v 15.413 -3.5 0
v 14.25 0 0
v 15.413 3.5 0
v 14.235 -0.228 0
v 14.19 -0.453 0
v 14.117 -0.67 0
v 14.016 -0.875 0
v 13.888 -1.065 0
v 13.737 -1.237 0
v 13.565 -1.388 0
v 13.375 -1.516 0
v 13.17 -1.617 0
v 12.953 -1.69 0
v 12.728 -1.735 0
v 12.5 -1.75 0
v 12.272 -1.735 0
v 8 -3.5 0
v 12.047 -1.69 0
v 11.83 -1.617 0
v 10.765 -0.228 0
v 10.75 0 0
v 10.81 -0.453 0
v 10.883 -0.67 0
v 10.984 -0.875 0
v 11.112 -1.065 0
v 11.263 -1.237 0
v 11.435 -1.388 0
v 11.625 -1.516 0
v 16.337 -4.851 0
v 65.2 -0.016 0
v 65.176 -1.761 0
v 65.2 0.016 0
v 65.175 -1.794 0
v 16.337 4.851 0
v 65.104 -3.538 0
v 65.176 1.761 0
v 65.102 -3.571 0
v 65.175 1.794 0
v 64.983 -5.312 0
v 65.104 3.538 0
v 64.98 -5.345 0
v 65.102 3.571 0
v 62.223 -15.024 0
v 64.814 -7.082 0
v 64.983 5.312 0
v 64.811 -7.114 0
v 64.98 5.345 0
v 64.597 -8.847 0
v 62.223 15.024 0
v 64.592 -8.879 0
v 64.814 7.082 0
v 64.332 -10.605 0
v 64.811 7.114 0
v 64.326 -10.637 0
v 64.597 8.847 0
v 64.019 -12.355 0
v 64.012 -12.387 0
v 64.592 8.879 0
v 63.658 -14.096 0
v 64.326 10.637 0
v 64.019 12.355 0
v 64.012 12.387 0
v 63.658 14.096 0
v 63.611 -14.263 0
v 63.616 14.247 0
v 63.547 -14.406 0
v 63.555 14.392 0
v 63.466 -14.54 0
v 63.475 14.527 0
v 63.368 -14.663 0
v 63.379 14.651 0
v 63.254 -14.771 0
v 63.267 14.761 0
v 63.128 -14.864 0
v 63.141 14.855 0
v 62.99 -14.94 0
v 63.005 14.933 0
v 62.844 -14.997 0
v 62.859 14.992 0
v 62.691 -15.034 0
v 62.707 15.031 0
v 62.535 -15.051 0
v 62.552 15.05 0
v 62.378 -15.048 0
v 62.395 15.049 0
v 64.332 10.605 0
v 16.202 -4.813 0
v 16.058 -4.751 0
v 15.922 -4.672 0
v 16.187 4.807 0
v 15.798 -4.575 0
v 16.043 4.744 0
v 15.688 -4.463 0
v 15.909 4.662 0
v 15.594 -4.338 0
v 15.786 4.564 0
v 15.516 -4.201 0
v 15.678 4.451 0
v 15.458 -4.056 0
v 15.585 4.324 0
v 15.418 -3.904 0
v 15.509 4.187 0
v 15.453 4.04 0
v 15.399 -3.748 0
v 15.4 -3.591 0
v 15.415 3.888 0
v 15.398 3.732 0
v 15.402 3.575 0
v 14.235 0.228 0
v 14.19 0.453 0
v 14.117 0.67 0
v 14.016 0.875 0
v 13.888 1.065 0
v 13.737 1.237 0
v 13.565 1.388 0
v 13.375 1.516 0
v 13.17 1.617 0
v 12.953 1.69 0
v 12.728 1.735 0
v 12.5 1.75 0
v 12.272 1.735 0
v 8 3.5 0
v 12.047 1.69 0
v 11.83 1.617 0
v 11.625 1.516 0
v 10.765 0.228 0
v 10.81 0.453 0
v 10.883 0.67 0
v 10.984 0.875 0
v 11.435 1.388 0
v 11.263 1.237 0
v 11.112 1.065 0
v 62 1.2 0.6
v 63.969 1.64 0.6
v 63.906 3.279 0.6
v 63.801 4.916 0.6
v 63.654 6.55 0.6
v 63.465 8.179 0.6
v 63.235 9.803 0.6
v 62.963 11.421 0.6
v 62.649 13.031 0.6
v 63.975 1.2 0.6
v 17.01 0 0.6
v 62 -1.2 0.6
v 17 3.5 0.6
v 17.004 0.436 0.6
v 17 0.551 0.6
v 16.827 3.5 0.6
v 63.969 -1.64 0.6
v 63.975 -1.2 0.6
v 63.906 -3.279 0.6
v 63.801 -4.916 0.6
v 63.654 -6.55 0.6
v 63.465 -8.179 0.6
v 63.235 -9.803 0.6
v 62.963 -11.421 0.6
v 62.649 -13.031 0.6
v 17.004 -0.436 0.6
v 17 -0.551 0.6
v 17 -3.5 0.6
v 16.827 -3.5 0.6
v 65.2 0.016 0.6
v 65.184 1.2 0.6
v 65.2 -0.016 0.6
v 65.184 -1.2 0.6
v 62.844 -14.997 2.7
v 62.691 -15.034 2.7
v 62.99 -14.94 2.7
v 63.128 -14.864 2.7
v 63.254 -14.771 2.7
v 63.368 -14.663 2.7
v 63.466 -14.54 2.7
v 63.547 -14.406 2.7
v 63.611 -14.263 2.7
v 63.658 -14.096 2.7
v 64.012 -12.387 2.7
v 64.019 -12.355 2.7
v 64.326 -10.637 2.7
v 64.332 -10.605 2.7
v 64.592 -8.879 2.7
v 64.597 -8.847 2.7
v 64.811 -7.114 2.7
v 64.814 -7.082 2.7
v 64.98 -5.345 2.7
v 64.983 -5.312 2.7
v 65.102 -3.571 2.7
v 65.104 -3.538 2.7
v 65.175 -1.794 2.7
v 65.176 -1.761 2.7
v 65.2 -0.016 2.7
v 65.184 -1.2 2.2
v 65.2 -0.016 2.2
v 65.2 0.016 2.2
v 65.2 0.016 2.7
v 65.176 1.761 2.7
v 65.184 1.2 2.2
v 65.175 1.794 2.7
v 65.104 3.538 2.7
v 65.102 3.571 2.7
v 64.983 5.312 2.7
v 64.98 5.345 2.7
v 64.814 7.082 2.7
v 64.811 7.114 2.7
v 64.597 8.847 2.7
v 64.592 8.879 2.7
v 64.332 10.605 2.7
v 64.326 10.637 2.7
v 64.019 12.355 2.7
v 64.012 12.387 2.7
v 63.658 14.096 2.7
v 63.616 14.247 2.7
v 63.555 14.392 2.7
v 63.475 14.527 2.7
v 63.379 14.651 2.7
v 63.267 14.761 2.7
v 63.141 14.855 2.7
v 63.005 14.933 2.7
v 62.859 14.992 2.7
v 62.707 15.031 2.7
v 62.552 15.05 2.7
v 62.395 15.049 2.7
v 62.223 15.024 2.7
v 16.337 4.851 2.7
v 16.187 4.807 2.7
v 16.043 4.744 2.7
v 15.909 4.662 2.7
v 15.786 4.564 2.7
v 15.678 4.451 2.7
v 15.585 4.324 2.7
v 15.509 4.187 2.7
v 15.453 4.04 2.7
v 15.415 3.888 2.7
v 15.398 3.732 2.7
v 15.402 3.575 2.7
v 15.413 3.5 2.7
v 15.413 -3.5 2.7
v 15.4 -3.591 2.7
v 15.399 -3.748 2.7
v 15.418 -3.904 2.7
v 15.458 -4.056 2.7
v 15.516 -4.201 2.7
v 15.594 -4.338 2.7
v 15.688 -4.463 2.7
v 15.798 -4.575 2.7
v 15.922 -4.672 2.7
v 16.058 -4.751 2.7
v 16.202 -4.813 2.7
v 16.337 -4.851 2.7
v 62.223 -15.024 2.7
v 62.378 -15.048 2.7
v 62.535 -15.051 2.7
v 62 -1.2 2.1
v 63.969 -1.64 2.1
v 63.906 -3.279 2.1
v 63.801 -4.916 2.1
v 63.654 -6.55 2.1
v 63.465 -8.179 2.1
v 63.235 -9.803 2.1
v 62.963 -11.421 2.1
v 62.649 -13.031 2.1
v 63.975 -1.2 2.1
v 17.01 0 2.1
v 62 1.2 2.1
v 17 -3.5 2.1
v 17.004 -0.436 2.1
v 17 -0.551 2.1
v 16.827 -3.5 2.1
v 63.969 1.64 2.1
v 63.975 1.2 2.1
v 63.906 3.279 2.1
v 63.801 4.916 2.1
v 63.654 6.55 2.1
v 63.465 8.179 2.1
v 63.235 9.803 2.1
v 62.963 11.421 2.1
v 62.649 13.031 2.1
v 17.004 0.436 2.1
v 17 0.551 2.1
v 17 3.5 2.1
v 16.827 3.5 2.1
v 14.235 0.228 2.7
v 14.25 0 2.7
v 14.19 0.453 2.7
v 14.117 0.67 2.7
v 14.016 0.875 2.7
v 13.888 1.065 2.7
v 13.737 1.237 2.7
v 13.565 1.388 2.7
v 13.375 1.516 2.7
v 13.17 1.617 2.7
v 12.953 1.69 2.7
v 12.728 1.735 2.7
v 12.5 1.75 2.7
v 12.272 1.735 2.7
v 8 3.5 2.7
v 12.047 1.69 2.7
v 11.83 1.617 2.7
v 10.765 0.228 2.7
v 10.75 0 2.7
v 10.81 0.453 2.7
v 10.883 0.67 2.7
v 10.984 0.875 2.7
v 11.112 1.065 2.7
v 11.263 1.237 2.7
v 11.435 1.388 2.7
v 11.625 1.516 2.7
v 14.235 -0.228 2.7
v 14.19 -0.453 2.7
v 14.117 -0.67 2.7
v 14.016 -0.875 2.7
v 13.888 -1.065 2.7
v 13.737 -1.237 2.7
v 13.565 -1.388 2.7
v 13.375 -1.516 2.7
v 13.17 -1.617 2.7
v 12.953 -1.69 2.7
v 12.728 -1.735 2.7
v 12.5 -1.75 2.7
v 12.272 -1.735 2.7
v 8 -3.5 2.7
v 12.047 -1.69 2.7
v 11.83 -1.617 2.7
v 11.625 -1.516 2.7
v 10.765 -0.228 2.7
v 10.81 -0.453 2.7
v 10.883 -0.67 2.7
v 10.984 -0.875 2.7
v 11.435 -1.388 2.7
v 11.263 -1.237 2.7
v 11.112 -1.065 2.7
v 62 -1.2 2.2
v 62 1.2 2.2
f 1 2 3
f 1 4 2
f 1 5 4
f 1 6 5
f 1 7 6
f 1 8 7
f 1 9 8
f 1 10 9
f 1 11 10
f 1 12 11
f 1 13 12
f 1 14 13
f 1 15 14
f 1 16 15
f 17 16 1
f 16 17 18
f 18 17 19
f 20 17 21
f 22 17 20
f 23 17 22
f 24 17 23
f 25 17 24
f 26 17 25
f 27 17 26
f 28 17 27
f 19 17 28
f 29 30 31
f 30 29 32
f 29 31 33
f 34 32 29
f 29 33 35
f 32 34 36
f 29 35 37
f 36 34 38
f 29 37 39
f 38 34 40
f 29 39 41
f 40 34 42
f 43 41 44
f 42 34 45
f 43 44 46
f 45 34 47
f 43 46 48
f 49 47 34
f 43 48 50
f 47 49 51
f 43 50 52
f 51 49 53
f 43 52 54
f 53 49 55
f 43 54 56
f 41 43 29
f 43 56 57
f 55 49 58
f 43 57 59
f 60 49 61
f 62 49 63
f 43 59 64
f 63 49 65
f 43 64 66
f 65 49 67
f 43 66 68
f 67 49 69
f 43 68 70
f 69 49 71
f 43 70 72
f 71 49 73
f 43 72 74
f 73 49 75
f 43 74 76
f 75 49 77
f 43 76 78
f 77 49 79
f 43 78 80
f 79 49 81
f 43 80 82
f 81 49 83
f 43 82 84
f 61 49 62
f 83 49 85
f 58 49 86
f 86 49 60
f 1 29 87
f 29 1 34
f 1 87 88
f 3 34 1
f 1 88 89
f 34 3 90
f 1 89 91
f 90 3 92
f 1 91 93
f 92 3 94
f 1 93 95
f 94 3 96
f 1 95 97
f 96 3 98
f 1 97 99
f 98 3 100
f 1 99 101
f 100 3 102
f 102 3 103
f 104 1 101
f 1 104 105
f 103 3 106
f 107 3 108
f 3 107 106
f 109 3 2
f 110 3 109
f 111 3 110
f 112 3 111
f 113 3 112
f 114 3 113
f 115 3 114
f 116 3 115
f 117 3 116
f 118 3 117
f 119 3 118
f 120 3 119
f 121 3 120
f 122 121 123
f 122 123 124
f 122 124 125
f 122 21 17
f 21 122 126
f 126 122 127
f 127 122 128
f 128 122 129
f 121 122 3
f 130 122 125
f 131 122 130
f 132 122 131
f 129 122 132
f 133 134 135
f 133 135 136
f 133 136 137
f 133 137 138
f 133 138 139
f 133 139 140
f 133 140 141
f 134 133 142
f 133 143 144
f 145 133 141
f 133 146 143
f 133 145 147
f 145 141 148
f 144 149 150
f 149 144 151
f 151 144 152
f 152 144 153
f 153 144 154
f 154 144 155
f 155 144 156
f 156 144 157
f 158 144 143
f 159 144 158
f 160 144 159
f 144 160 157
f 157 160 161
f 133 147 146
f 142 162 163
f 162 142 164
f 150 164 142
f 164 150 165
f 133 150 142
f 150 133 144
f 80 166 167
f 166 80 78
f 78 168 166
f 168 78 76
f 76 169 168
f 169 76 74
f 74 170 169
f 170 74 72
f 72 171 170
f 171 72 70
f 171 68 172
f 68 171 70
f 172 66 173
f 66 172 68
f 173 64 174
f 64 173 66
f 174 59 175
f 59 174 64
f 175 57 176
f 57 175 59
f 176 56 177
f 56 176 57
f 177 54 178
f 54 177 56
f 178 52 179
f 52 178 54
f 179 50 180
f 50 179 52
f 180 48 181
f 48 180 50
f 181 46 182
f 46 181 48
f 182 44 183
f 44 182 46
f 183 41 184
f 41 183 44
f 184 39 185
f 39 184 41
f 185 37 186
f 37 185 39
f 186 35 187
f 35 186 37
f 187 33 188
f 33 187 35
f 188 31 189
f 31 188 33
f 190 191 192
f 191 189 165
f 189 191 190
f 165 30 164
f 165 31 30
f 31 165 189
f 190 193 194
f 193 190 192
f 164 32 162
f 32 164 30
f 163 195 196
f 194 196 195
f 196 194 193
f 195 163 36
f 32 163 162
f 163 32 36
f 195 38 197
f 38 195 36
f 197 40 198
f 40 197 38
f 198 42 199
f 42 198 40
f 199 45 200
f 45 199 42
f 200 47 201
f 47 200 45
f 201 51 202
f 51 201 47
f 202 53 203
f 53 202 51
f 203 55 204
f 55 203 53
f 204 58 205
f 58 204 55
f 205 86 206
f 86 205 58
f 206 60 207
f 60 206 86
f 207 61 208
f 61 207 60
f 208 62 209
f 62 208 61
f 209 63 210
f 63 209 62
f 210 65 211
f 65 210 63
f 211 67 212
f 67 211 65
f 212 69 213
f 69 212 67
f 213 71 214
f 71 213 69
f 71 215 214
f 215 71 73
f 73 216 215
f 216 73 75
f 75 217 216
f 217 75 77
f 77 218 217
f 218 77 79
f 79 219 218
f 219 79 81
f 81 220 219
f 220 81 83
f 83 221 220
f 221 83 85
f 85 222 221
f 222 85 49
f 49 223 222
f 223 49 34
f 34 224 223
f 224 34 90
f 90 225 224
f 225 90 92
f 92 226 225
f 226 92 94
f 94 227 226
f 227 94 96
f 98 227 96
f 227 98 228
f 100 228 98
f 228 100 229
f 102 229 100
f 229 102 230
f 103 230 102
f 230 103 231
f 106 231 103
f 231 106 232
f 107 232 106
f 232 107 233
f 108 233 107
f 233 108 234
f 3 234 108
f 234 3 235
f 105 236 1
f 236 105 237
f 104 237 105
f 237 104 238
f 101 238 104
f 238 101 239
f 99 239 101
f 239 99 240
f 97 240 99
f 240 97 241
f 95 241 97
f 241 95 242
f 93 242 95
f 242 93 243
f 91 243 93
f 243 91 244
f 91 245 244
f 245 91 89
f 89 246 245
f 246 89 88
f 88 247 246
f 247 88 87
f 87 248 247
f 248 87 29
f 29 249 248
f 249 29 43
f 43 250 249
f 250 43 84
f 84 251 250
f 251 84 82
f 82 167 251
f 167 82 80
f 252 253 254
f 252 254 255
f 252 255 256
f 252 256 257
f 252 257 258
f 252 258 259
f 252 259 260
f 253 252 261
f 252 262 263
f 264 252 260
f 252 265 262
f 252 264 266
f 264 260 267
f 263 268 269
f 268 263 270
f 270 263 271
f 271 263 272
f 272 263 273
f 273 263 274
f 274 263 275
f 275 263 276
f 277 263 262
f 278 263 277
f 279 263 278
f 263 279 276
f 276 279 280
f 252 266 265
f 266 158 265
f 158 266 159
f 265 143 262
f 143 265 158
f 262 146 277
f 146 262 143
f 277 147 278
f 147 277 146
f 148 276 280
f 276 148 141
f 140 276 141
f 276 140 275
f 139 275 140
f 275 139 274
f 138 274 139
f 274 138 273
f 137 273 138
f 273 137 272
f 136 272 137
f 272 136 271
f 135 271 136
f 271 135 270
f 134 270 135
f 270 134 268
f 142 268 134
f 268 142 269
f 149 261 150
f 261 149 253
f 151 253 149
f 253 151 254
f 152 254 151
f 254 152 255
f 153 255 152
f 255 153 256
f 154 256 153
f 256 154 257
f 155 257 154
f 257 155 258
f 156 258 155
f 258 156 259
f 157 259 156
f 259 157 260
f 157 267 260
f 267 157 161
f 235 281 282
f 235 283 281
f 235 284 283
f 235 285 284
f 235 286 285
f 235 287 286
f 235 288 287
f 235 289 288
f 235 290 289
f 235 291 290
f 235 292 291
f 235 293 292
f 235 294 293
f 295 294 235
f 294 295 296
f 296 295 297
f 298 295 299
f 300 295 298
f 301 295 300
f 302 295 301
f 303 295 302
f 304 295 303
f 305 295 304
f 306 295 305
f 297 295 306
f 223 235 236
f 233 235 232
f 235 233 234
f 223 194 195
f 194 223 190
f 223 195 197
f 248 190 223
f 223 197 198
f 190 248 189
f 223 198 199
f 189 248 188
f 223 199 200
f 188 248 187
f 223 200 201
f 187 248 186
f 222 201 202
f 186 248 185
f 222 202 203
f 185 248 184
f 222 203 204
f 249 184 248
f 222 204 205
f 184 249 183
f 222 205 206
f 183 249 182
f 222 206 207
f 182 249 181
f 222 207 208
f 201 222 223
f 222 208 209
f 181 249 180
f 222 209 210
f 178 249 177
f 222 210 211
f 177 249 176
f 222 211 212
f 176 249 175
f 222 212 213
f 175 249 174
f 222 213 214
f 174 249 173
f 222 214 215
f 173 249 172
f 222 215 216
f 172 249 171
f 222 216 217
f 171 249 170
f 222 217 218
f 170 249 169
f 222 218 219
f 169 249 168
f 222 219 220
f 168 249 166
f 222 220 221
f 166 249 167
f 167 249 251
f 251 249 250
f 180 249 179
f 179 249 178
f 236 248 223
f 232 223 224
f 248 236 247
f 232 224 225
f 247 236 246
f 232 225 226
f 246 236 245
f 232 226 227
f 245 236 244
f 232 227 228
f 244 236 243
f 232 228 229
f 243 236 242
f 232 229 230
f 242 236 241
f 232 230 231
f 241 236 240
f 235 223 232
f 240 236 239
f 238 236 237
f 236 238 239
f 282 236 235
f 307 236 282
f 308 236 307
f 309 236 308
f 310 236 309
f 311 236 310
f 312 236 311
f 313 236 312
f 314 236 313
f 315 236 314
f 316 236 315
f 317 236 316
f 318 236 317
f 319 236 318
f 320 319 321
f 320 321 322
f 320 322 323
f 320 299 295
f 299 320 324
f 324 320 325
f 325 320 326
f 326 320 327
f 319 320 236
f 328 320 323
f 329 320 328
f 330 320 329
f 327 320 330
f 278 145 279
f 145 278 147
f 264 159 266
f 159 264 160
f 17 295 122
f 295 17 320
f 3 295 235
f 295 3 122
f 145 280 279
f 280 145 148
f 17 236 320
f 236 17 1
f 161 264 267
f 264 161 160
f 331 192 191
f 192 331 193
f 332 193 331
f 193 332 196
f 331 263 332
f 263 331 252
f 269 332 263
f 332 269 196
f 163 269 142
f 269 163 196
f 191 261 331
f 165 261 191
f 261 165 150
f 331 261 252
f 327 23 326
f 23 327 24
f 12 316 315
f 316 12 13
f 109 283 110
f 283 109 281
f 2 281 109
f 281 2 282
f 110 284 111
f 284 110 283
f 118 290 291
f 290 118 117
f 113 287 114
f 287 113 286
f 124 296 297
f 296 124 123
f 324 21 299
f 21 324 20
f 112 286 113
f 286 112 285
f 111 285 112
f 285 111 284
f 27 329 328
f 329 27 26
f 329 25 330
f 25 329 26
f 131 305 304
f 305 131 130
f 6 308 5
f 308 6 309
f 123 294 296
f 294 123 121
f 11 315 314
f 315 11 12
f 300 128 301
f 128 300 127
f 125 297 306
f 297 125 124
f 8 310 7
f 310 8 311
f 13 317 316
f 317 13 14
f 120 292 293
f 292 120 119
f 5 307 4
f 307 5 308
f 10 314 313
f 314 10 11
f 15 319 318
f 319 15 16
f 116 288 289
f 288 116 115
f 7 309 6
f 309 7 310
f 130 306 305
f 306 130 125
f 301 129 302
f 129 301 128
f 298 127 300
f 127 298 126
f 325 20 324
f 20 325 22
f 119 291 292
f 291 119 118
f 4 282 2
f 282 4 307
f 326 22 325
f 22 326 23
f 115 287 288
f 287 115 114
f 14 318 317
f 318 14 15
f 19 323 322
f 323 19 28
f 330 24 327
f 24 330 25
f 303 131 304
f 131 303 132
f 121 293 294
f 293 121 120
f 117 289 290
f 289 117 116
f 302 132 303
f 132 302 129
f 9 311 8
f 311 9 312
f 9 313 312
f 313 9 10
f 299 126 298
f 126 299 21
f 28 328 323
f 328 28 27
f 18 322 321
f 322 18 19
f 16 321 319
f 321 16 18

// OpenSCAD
// file: parameters.scad
// =============================================================================
// Gen-AJ Vernier flux-claw ultra — WOUND-AWARE (HARD GATE)
// Dual-rotor vernier: Rotor B +22.5° vs 12-slot stator; Ø5 flux claws
// =============================================================================

wire_awg            = 26;
wire_od             = 0.45;
turns               = 175;
fill                = 0.70;
layers_per_face     = 2;
wind_build_axial    = layers_per_face * wire_od * fill;   // 0.63 mm
wind_build_radial   = 3 * wire_od * fill;                 // 0.945 mm

coil_id_r           = 17.0;
coil_od_r           = 64.0;
span_deg            = 25.0;
former_web          = 1.50;
flange_t            = 0.60;
wall                = 1.2;
slot_w              = 2.4;
mount_hole          = 3.5;
tab_len             = 7.0;

former_bare_h       = former_web + 2 * flange_t;            // 2.70 mm
coil_envelope_h     = former_bare_h + 2 * wind_build_axial; // 3.96 mm

run_clear           = 0.50;
gap_spacer_h        = run_clear + wind_build_axial;         // 1.13 mm
m2m                 = coil_envelope_h + 2 * run_clear;      // 4.96 mm

coil_stations       = 12;
bay_r_in            = coil_id_r - 2.0 - wind_build_radial;
bay_r_out           = coil_od_r + 2.0 + wind_build_radial;
bay_span            = span_deg + 4.0;
bay_offset          = 2.0;
stator_thick        = former_bare_h;
stator_od           = 160.0;
shaft_clear_stator  = 34.0;
coil_mount_r        = 26.0;

large_pocket_d      = 20.3;
small_pocket_d      = 5.3;
pocket_h            = 5.2;
large_n             = 8;
R_large             = 42.0;
R_small_inner       = 27.0;
R_small_mid         = 42.0;
R_small_outer       = 57.0;
carrier_od          = 156.0;
carrier_thick       = 7.5;
hub_h               = 10.0;
hub_od              = 30.0;
rotor_b_offset_deg  = 22.5;     // vernier offset vs 12-slot stator

shaft_bore          = 8.35;
bearing_d           = 21.85;
bearing_h           = 7.2;
m3_clear            = 3.5;
bolt_r_inner        = 36.0;
bolt_n_inner        = 6;
flange_bolt_r       = 72.0;
flange_bolt_n       = 6;
brace_r             = 68.0;
brace_d             = 4.3;
brace_n             = 4;

spacer_pad_od       = 14.0;
spacer_pad_id       = m3_clear;
endbell_od          = 160.0;
endbell_thick       = 8.0;
endbell_shaft_clear = 10.0;

$fn = 64;
// main file
// Gen-AJ pancake former — wind BEFORE assembly
include <parameters.scad>;
$fn = 48;

module sector_2d(r_in, r_out, ang) {
    polygon([
        for (a = [-ang/2 : ang/16 : ang/2]) [r_in*cos(a), r_in*sin(a)],
        for (a = [ang/2 : -ang/16 : -ang/2]) [r_out*cos(a), r_out*sin(a)]
    ]);
}
module flange() {
    linear_extrude(flange_t) offset(r=wall) sector_2d(coil_id_r, coil_od_r, span_deg);
}
difference() {
    union() {
        flange();
        translate([0, 0, flange_t])
            linear_extrude(former_web)
                difference() {
                    offset(r=wall) sector_2d(coil_id_r, coil_od_r, span_deg);
                    sector_2d(coil_id_r + 0.01, coil_od_r - 0.01, span_deg - 1.5);
                }
        translate([0, 0, flange_t + former_web]) flange();
        translate([coil_id_r - tab_len - 2, -3.5, 0])
            cube([tab_len + 2, 7, former_bare_h]);
    }
    translate([coil_od_r - 2, -slot_w/2, flange_t])
        cube([wall + 4, slot_w, former_web + 0.1]);
    translate([coil_id_r - tab_len/2 - 1, 0, -0.1])
        cylinder(d=mount_hole, h=former_bare_h + 1);
}
